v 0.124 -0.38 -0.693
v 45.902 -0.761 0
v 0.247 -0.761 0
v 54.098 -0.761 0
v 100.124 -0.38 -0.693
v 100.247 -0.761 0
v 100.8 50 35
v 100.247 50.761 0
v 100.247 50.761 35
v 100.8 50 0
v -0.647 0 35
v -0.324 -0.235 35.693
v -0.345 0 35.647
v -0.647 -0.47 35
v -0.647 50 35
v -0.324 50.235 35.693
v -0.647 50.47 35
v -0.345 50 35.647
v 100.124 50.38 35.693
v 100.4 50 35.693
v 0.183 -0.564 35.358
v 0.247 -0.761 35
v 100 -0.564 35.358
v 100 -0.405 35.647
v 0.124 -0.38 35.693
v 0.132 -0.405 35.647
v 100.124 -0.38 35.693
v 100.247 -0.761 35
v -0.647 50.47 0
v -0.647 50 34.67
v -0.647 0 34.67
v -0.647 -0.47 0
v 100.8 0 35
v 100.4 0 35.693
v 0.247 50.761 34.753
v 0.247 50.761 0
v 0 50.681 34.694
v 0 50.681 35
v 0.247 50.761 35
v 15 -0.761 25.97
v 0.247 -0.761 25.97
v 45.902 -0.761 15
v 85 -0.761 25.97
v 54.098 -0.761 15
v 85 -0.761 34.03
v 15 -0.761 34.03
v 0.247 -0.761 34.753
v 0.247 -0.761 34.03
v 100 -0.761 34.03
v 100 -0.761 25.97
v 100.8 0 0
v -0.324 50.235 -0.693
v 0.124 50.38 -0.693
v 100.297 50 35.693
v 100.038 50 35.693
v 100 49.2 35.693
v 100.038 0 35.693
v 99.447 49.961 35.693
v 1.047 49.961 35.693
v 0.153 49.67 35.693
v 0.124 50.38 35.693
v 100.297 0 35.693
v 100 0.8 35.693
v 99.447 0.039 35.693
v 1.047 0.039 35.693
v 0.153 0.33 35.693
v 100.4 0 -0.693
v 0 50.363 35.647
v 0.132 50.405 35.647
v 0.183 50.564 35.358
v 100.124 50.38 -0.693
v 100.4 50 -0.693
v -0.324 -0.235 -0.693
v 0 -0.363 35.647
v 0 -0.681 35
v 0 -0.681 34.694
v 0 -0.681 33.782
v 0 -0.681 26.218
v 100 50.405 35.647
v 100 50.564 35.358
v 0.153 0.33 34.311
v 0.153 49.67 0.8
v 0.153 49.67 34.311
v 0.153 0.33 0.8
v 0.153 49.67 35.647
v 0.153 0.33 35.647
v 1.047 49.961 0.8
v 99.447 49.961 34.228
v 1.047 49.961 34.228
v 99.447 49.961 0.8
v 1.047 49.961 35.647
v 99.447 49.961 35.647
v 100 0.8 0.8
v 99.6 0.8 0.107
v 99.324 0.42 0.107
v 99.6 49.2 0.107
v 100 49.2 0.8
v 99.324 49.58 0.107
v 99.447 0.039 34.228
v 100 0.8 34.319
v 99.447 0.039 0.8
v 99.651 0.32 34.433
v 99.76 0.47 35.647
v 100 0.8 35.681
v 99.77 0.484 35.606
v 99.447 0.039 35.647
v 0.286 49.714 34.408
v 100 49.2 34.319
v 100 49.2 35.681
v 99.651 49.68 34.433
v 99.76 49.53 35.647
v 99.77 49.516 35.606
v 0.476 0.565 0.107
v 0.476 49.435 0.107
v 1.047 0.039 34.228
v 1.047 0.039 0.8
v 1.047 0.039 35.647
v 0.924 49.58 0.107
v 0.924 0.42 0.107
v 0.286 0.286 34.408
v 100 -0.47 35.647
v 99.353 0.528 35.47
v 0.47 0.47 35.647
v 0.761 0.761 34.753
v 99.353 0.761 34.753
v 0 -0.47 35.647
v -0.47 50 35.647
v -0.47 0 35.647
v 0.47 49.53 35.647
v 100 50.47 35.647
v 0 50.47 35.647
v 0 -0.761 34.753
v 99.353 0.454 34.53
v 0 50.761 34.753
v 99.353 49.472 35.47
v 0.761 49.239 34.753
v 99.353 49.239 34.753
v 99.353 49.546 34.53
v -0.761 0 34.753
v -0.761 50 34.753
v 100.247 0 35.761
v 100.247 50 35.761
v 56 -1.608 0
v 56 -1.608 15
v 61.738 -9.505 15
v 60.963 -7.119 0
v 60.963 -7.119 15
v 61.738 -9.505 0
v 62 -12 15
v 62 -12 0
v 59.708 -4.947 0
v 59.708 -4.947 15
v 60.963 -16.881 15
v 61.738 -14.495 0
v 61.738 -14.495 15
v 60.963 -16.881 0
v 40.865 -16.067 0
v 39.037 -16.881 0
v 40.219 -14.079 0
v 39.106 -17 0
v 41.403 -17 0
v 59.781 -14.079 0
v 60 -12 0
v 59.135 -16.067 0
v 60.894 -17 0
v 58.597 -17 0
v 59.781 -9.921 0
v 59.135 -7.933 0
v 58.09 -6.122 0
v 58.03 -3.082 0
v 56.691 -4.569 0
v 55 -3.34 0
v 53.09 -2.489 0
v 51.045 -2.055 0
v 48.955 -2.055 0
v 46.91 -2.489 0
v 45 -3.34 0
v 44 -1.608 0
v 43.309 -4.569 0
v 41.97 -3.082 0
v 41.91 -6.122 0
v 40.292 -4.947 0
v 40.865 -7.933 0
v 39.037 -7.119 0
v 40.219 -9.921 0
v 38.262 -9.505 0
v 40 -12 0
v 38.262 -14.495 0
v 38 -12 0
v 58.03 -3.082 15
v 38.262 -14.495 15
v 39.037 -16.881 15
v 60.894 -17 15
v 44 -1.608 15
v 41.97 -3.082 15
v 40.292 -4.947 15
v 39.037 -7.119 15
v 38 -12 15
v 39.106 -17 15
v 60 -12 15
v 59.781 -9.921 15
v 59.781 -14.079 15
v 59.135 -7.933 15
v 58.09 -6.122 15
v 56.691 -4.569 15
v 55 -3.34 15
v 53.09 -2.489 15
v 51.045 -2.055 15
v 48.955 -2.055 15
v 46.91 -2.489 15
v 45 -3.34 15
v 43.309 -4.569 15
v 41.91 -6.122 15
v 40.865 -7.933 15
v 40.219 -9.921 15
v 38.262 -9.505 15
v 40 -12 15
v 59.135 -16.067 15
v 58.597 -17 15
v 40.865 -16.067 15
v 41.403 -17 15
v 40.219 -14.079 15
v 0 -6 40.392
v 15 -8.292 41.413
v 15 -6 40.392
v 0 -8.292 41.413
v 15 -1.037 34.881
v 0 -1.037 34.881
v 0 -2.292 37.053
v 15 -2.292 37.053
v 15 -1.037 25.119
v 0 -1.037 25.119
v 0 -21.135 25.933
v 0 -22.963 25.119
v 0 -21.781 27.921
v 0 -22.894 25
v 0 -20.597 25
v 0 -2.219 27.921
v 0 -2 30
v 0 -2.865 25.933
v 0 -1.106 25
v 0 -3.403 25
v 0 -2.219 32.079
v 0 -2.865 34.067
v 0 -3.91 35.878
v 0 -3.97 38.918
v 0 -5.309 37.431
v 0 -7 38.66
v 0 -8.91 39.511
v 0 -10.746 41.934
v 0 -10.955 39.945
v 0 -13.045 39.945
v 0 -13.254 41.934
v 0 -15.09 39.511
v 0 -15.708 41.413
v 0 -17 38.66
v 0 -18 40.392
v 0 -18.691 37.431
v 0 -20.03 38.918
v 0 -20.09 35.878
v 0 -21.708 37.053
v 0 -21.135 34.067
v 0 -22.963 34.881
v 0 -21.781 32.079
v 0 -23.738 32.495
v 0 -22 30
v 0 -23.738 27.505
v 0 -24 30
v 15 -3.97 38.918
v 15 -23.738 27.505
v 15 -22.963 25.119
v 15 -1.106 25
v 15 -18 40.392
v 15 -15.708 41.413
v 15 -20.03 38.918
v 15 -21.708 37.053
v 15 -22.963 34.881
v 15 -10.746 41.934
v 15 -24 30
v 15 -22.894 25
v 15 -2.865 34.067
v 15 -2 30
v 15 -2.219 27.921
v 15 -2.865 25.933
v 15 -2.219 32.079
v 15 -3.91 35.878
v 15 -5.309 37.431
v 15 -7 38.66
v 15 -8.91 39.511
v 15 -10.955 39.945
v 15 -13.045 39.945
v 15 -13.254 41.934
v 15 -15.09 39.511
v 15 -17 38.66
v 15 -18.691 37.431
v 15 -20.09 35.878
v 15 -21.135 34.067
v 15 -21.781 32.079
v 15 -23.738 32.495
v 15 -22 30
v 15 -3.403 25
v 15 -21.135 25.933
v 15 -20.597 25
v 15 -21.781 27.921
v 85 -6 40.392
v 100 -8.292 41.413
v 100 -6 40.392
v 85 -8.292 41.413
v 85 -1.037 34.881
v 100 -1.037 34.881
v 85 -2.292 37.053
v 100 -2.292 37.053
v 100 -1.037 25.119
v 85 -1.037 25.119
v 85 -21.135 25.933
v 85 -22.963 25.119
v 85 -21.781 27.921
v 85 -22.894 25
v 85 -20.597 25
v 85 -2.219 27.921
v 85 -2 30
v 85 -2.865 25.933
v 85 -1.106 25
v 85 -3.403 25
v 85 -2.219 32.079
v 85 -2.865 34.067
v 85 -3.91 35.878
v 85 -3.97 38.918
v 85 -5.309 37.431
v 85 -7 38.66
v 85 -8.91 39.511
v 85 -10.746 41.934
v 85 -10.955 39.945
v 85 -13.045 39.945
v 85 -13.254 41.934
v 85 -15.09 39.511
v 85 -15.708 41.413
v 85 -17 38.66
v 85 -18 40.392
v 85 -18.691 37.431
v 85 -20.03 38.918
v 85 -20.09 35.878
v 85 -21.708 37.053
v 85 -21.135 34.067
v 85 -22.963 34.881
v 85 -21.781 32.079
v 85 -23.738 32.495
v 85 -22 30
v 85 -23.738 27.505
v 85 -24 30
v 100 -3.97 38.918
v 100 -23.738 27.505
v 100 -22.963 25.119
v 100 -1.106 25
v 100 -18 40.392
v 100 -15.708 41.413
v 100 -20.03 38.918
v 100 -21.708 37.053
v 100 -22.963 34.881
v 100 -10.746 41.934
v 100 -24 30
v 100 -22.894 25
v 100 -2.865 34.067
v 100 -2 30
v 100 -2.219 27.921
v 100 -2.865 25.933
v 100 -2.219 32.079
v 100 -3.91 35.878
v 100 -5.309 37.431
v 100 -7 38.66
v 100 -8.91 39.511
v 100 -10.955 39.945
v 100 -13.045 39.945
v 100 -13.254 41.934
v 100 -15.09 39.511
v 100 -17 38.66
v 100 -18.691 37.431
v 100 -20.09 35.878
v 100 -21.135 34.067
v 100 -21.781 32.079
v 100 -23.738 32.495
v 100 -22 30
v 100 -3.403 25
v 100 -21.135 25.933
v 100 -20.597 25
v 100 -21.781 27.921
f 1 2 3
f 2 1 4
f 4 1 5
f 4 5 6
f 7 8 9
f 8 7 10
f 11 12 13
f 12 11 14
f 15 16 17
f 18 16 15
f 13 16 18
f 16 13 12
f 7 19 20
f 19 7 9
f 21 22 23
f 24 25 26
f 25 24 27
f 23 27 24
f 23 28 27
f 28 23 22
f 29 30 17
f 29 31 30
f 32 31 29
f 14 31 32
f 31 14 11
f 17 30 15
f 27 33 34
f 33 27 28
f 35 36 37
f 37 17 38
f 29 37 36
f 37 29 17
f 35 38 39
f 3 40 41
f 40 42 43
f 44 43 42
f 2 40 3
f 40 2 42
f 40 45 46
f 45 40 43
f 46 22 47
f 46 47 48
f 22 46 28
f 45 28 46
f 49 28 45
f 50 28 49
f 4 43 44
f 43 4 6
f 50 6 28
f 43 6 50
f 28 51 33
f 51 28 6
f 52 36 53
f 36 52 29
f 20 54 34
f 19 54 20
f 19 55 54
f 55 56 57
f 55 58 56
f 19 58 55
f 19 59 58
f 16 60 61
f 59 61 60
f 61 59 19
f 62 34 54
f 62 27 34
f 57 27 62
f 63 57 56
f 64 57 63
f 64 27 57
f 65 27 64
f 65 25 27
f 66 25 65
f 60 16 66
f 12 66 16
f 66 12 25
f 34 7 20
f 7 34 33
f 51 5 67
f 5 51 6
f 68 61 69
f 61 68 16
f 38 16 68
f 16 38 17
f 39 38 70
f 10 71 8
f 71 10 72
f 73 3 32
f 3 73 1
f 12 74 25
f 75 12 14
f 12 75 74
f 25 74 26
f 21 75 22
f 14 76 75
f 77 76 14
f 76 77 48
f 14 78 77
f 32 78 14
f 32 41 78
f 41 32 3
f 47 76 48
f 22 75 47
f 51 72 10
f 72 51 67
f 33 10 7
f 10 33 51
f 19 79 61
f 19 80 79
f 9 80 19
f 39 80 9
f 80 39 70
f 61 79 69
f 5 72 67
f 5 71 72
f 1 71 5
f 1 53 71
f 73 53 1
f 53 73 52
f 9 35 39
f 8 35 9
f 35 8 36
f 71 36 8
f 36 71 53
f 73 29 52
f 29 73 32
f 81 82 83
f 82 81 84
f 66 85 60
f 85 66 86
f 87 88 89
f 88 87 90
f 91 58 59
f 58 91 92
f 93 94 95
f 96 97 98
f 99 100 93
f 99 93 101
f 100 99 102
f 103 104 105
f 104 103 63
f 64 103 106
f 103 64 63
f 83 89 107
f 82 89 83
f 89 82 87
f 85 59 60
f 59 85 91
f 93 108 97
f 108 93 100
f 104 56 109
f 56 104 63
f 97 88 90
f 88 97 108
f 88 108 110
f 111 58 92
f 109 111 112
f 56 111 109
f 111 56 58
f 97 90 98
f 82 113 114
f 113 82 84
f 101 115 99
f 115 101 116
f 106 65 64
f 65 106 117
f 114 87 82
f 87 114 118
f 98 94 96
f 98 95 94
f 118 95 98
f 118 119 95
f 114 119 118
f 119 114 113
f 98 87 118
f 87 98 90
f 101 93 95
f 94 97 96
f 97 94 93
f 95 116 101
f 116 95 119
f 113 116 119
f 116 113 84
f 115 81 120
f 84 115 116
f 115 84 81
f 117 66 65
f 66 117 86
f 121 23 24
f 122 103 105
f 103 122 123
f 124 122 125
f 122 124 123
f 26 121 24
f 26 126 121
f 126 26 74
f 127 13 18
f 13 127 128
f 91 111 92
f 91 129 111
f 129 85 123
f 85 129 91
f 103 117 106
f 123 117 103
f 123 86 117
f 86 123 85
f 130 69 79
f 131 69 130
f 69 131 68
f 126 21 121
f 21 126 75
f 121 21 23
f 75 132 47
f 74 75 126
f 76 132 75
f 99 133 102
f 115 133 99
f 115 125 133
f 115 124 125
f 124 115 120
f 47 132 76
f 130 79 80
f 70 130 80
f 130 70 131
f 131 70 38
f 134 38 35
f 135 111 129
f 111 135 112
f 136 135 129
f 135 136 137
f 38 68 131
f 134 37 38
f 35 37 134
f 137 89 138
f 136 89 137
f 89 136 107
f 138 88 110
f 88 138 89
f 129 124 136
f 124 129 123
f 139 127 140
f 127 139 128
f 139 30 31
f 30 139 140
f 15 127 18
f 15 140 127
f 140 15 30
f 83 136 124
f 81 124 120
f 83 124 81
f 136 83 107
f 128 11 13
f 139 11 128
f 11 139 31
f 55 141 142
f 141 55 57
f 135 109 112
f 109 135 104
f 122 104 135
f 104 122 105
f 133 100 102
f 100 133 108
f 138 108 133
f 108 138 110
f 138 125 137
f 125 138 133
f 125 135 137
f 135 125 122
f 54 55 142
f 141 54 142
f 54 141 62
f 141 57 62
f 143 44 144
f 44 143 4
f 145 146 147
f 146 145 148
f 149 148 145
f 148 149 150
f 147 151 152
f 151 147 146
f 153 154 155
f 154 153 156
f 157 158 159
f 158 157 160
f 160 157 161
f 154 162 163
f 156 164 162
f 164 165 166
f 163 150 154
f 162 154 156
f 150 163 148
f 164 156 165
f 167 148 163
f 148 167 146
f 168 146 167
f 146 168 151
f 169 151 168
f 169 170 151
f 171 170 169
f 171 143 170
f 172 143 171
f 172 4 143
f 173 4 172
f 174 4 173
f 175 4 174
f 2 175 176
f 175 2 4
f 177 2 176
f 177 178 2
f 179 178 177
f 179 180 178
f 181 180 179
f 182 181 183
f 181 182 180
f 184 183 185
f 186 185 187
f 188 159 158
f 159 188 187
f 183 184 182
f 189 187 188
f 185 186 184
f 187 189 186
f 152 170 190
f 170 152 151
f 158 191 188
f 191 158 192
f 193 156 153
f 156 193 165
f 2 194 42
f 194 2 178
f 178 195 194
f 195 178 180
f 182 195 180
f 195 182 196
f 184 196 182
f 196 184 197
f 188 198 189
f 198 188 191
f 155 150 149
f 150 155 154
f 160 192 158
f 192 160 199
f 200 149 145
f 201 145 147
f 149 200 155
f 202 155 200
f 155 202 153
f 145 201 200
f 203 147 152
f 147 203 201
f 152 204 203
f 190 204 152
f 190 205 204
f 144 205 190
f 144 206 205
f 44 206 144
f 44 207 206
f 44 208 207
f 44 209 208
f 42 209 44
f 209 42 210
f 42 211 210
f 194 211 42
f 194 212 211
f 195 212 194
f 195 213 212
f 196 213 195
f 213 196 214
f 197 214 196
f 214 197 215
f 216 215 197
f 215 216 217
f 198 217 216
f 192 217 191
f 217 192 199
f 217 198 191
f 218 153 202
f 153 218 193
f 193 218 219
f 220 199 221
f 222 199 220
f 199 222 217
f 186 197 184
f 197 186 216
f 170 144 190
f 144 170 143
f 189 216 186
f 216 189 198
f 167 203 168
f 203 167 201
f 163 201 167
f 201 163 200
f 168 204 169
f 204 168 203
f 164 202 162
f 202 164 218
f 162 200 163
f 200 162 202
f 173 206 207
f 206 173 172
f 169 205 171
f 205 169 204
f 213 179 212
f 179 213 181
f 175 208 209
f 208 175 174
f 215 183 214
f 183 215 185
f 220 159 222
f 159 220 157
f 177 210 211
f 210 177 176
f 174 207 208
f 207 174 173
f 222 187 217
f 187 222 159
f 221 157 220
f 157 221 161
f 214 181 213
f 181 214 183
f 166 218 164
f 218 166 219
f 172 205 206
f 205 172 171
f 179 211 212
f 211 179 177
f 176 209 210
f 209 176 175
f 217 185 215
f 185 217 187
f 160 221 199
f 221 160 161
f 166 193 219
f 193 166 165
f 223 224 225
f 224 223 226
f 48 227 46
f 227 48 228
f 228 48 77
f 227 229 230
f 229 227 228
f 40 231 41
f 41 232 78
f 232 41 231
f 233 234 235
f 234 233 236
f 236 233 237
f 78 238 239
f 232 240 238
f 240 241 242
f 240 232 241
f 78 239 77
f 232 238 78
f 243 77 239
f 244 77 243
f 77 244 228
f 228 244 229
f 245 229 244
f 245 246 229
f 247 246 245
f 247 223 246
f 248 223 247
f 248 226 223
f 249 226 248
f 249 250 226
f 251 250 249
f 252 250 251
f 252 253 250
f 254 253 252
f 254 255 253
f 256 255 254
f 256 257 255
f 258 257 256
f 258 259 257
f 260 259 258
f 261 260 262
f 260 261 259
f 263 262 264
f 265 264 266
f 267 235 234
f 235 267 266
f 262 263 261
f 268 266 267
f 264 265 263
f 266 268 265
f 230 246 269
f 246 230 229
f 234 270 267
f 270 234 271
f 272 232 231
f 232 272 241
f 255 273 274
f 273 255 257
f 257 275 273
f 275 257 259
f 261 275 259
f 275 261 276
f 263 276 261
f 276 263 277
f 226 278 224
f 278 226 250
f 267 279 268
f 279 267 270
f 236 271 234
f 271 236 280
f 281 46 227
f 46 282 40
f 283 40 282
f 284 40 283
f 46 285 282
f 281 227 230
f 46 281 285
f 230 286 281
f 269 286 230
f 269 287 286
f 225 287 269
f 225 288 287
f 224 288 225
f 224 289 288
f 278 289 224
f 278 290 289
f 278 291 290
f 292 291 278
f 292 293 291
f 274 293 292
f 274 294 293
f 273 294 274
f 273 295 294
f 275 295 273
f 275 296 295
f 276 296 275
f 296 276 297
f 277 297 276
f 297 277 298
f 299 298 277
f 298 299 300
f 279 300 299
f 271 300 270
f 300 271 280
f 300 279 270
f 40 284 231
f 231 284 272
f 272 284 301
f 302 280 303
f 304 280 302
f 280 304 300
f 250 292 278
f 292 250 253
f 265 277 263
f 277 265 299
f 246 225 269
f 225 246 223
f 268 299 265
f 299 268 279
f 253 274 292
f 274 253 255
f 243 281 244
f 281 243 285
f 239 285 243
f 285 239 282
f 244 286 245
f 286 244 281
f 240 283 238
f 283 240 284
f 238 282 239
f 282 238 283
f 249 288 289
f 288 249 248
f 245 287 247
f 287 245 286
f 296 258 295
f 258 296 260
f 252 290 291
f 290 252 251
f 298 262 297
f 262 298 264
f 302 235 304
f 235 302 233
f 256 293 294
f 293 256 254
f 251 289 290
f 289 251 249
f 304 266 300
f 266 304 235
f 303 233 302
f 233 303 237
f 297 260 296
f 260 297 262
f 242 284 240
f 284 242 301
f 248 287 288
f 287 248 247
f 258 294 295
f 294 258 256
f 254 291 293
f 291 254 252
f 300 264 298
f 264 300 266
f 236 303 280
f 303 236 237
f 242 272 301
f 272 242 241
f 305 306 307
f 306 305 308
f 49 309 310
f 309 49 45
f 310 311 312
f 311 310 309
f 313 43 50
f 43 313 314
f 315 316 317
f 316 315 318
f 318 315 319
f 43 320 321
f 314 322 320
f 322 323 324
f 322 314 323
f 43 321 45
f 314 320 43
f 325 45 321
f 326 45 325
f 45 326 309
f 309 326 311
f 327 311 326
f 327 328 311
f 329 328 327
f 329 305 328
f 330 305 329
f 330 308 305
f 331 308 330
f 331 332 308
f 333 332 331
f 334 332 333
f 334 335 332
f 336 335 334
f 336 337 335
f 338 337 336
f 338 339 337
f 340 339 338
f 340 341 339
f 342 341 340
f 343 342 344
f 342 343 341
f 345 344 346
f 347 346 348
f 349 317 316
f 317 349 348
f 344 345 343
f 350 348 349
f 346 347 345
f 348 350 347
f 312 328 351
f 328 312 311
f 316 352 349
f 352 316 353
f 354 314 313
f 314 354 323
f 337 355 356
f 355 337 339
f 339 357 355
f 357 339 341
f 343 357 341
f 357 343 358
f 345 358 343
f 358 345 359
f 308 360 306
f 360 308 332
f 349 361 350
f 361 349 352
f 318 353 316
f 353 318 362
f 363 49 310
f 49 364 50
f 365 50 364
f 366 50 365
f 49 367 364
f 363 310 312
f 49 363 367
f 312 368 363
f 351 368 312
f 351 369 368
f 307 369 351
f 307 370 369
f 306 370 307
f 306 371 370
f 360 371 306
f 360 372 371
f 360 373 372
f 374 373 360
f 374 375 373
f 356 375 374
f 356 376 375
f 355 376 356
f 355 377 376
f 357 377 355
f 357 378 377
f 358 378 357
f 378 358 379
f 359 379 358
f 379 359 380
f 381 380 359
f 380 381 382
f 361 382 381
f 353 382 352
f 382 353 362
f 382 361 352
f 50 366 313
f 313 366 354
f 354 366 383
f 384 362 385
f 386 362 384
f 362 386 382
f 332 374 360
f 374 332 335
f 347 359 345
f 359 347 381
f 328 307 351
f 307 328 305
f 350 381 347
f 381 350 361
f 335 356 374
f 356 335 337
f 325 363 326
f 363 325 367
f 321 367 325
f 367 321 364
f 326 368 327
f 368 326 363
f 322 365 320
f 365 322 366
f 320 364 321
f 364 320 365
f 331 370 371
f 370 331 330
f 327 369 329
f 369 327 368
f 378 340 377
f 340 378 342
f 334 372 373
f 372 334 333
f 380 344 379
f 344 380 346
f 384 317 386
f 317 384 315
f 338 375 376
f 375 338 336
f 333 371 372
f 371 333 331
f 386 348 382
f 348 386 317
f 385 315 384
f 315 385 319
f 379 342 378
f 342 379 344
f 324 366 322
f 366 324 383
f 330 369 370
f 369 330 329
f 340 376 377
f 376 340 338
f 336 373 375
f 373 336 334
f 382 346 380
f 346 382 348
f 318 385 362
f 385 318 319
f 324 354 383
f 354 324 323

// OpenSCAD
/* $fn = 50; */
clip_r = 10;
width = 100;
height = 35;
depth = 50;
thickness = 0.8;
clip_thick = 2;
clip_w = 15;

module clip() {
  intersection() {
    difference() {
      cylinder(clip_w, r=clip_r + clip_thick);
      translate([0, 0, -thickness/2])
        cylinder(clip_w+thickness, r=clip_r);
    }
    translate([-clip_r*1.5, -clip_r/2, 0])
      cube([clip_r*3, clip_r*2, clip_w]);
  }
}

module basket() {
  module block(w, d, h) {
    hull() {
      for (x = [0, w]) {
        for (y = [0, d]) {
          for (z = [0, h]) {
            translate([x, y, z])
              sphere(thickness);
          }
        }
      }
    }
  }
  t2 = thickness * 2;
  difference() {
    block(width, depth, height);
    translate([thickness, thickness, thickness])
      block(width-t2, depth-t2, height);
  }
  translate([0,0,height]) {
    rotate(90, [0,1,0])
      cylinder(width, r=thickness);
    translate([0, depth, 0])
      rotate(90, [0,1,0])
        cylinder(width, r=thickness);
    rotate(90, [0,1,0])
    rotate(90, [-1,0,0])
      cylinder(depth, r=thickness);
    translate([width, 0, 0])
      rotate(90, [-1,0,0])
        cylinder(depth, r=thickness);
  }
}

basket();
translate([width/2, -clip_r-clip_thick, 0])
  clip();
translate([0,-clip_r-clip_thick,height-(clip_r/2)])
  rotate(90,[0,1,0])
    rotate(90, [0,0,1])
        clip();
translate([width-clip_w,-clip_r-clip_thick,height-(clip_r/2)])
  rotate(90,[0,1,0])
    rotate(90, [0,0,1])
      clip();
